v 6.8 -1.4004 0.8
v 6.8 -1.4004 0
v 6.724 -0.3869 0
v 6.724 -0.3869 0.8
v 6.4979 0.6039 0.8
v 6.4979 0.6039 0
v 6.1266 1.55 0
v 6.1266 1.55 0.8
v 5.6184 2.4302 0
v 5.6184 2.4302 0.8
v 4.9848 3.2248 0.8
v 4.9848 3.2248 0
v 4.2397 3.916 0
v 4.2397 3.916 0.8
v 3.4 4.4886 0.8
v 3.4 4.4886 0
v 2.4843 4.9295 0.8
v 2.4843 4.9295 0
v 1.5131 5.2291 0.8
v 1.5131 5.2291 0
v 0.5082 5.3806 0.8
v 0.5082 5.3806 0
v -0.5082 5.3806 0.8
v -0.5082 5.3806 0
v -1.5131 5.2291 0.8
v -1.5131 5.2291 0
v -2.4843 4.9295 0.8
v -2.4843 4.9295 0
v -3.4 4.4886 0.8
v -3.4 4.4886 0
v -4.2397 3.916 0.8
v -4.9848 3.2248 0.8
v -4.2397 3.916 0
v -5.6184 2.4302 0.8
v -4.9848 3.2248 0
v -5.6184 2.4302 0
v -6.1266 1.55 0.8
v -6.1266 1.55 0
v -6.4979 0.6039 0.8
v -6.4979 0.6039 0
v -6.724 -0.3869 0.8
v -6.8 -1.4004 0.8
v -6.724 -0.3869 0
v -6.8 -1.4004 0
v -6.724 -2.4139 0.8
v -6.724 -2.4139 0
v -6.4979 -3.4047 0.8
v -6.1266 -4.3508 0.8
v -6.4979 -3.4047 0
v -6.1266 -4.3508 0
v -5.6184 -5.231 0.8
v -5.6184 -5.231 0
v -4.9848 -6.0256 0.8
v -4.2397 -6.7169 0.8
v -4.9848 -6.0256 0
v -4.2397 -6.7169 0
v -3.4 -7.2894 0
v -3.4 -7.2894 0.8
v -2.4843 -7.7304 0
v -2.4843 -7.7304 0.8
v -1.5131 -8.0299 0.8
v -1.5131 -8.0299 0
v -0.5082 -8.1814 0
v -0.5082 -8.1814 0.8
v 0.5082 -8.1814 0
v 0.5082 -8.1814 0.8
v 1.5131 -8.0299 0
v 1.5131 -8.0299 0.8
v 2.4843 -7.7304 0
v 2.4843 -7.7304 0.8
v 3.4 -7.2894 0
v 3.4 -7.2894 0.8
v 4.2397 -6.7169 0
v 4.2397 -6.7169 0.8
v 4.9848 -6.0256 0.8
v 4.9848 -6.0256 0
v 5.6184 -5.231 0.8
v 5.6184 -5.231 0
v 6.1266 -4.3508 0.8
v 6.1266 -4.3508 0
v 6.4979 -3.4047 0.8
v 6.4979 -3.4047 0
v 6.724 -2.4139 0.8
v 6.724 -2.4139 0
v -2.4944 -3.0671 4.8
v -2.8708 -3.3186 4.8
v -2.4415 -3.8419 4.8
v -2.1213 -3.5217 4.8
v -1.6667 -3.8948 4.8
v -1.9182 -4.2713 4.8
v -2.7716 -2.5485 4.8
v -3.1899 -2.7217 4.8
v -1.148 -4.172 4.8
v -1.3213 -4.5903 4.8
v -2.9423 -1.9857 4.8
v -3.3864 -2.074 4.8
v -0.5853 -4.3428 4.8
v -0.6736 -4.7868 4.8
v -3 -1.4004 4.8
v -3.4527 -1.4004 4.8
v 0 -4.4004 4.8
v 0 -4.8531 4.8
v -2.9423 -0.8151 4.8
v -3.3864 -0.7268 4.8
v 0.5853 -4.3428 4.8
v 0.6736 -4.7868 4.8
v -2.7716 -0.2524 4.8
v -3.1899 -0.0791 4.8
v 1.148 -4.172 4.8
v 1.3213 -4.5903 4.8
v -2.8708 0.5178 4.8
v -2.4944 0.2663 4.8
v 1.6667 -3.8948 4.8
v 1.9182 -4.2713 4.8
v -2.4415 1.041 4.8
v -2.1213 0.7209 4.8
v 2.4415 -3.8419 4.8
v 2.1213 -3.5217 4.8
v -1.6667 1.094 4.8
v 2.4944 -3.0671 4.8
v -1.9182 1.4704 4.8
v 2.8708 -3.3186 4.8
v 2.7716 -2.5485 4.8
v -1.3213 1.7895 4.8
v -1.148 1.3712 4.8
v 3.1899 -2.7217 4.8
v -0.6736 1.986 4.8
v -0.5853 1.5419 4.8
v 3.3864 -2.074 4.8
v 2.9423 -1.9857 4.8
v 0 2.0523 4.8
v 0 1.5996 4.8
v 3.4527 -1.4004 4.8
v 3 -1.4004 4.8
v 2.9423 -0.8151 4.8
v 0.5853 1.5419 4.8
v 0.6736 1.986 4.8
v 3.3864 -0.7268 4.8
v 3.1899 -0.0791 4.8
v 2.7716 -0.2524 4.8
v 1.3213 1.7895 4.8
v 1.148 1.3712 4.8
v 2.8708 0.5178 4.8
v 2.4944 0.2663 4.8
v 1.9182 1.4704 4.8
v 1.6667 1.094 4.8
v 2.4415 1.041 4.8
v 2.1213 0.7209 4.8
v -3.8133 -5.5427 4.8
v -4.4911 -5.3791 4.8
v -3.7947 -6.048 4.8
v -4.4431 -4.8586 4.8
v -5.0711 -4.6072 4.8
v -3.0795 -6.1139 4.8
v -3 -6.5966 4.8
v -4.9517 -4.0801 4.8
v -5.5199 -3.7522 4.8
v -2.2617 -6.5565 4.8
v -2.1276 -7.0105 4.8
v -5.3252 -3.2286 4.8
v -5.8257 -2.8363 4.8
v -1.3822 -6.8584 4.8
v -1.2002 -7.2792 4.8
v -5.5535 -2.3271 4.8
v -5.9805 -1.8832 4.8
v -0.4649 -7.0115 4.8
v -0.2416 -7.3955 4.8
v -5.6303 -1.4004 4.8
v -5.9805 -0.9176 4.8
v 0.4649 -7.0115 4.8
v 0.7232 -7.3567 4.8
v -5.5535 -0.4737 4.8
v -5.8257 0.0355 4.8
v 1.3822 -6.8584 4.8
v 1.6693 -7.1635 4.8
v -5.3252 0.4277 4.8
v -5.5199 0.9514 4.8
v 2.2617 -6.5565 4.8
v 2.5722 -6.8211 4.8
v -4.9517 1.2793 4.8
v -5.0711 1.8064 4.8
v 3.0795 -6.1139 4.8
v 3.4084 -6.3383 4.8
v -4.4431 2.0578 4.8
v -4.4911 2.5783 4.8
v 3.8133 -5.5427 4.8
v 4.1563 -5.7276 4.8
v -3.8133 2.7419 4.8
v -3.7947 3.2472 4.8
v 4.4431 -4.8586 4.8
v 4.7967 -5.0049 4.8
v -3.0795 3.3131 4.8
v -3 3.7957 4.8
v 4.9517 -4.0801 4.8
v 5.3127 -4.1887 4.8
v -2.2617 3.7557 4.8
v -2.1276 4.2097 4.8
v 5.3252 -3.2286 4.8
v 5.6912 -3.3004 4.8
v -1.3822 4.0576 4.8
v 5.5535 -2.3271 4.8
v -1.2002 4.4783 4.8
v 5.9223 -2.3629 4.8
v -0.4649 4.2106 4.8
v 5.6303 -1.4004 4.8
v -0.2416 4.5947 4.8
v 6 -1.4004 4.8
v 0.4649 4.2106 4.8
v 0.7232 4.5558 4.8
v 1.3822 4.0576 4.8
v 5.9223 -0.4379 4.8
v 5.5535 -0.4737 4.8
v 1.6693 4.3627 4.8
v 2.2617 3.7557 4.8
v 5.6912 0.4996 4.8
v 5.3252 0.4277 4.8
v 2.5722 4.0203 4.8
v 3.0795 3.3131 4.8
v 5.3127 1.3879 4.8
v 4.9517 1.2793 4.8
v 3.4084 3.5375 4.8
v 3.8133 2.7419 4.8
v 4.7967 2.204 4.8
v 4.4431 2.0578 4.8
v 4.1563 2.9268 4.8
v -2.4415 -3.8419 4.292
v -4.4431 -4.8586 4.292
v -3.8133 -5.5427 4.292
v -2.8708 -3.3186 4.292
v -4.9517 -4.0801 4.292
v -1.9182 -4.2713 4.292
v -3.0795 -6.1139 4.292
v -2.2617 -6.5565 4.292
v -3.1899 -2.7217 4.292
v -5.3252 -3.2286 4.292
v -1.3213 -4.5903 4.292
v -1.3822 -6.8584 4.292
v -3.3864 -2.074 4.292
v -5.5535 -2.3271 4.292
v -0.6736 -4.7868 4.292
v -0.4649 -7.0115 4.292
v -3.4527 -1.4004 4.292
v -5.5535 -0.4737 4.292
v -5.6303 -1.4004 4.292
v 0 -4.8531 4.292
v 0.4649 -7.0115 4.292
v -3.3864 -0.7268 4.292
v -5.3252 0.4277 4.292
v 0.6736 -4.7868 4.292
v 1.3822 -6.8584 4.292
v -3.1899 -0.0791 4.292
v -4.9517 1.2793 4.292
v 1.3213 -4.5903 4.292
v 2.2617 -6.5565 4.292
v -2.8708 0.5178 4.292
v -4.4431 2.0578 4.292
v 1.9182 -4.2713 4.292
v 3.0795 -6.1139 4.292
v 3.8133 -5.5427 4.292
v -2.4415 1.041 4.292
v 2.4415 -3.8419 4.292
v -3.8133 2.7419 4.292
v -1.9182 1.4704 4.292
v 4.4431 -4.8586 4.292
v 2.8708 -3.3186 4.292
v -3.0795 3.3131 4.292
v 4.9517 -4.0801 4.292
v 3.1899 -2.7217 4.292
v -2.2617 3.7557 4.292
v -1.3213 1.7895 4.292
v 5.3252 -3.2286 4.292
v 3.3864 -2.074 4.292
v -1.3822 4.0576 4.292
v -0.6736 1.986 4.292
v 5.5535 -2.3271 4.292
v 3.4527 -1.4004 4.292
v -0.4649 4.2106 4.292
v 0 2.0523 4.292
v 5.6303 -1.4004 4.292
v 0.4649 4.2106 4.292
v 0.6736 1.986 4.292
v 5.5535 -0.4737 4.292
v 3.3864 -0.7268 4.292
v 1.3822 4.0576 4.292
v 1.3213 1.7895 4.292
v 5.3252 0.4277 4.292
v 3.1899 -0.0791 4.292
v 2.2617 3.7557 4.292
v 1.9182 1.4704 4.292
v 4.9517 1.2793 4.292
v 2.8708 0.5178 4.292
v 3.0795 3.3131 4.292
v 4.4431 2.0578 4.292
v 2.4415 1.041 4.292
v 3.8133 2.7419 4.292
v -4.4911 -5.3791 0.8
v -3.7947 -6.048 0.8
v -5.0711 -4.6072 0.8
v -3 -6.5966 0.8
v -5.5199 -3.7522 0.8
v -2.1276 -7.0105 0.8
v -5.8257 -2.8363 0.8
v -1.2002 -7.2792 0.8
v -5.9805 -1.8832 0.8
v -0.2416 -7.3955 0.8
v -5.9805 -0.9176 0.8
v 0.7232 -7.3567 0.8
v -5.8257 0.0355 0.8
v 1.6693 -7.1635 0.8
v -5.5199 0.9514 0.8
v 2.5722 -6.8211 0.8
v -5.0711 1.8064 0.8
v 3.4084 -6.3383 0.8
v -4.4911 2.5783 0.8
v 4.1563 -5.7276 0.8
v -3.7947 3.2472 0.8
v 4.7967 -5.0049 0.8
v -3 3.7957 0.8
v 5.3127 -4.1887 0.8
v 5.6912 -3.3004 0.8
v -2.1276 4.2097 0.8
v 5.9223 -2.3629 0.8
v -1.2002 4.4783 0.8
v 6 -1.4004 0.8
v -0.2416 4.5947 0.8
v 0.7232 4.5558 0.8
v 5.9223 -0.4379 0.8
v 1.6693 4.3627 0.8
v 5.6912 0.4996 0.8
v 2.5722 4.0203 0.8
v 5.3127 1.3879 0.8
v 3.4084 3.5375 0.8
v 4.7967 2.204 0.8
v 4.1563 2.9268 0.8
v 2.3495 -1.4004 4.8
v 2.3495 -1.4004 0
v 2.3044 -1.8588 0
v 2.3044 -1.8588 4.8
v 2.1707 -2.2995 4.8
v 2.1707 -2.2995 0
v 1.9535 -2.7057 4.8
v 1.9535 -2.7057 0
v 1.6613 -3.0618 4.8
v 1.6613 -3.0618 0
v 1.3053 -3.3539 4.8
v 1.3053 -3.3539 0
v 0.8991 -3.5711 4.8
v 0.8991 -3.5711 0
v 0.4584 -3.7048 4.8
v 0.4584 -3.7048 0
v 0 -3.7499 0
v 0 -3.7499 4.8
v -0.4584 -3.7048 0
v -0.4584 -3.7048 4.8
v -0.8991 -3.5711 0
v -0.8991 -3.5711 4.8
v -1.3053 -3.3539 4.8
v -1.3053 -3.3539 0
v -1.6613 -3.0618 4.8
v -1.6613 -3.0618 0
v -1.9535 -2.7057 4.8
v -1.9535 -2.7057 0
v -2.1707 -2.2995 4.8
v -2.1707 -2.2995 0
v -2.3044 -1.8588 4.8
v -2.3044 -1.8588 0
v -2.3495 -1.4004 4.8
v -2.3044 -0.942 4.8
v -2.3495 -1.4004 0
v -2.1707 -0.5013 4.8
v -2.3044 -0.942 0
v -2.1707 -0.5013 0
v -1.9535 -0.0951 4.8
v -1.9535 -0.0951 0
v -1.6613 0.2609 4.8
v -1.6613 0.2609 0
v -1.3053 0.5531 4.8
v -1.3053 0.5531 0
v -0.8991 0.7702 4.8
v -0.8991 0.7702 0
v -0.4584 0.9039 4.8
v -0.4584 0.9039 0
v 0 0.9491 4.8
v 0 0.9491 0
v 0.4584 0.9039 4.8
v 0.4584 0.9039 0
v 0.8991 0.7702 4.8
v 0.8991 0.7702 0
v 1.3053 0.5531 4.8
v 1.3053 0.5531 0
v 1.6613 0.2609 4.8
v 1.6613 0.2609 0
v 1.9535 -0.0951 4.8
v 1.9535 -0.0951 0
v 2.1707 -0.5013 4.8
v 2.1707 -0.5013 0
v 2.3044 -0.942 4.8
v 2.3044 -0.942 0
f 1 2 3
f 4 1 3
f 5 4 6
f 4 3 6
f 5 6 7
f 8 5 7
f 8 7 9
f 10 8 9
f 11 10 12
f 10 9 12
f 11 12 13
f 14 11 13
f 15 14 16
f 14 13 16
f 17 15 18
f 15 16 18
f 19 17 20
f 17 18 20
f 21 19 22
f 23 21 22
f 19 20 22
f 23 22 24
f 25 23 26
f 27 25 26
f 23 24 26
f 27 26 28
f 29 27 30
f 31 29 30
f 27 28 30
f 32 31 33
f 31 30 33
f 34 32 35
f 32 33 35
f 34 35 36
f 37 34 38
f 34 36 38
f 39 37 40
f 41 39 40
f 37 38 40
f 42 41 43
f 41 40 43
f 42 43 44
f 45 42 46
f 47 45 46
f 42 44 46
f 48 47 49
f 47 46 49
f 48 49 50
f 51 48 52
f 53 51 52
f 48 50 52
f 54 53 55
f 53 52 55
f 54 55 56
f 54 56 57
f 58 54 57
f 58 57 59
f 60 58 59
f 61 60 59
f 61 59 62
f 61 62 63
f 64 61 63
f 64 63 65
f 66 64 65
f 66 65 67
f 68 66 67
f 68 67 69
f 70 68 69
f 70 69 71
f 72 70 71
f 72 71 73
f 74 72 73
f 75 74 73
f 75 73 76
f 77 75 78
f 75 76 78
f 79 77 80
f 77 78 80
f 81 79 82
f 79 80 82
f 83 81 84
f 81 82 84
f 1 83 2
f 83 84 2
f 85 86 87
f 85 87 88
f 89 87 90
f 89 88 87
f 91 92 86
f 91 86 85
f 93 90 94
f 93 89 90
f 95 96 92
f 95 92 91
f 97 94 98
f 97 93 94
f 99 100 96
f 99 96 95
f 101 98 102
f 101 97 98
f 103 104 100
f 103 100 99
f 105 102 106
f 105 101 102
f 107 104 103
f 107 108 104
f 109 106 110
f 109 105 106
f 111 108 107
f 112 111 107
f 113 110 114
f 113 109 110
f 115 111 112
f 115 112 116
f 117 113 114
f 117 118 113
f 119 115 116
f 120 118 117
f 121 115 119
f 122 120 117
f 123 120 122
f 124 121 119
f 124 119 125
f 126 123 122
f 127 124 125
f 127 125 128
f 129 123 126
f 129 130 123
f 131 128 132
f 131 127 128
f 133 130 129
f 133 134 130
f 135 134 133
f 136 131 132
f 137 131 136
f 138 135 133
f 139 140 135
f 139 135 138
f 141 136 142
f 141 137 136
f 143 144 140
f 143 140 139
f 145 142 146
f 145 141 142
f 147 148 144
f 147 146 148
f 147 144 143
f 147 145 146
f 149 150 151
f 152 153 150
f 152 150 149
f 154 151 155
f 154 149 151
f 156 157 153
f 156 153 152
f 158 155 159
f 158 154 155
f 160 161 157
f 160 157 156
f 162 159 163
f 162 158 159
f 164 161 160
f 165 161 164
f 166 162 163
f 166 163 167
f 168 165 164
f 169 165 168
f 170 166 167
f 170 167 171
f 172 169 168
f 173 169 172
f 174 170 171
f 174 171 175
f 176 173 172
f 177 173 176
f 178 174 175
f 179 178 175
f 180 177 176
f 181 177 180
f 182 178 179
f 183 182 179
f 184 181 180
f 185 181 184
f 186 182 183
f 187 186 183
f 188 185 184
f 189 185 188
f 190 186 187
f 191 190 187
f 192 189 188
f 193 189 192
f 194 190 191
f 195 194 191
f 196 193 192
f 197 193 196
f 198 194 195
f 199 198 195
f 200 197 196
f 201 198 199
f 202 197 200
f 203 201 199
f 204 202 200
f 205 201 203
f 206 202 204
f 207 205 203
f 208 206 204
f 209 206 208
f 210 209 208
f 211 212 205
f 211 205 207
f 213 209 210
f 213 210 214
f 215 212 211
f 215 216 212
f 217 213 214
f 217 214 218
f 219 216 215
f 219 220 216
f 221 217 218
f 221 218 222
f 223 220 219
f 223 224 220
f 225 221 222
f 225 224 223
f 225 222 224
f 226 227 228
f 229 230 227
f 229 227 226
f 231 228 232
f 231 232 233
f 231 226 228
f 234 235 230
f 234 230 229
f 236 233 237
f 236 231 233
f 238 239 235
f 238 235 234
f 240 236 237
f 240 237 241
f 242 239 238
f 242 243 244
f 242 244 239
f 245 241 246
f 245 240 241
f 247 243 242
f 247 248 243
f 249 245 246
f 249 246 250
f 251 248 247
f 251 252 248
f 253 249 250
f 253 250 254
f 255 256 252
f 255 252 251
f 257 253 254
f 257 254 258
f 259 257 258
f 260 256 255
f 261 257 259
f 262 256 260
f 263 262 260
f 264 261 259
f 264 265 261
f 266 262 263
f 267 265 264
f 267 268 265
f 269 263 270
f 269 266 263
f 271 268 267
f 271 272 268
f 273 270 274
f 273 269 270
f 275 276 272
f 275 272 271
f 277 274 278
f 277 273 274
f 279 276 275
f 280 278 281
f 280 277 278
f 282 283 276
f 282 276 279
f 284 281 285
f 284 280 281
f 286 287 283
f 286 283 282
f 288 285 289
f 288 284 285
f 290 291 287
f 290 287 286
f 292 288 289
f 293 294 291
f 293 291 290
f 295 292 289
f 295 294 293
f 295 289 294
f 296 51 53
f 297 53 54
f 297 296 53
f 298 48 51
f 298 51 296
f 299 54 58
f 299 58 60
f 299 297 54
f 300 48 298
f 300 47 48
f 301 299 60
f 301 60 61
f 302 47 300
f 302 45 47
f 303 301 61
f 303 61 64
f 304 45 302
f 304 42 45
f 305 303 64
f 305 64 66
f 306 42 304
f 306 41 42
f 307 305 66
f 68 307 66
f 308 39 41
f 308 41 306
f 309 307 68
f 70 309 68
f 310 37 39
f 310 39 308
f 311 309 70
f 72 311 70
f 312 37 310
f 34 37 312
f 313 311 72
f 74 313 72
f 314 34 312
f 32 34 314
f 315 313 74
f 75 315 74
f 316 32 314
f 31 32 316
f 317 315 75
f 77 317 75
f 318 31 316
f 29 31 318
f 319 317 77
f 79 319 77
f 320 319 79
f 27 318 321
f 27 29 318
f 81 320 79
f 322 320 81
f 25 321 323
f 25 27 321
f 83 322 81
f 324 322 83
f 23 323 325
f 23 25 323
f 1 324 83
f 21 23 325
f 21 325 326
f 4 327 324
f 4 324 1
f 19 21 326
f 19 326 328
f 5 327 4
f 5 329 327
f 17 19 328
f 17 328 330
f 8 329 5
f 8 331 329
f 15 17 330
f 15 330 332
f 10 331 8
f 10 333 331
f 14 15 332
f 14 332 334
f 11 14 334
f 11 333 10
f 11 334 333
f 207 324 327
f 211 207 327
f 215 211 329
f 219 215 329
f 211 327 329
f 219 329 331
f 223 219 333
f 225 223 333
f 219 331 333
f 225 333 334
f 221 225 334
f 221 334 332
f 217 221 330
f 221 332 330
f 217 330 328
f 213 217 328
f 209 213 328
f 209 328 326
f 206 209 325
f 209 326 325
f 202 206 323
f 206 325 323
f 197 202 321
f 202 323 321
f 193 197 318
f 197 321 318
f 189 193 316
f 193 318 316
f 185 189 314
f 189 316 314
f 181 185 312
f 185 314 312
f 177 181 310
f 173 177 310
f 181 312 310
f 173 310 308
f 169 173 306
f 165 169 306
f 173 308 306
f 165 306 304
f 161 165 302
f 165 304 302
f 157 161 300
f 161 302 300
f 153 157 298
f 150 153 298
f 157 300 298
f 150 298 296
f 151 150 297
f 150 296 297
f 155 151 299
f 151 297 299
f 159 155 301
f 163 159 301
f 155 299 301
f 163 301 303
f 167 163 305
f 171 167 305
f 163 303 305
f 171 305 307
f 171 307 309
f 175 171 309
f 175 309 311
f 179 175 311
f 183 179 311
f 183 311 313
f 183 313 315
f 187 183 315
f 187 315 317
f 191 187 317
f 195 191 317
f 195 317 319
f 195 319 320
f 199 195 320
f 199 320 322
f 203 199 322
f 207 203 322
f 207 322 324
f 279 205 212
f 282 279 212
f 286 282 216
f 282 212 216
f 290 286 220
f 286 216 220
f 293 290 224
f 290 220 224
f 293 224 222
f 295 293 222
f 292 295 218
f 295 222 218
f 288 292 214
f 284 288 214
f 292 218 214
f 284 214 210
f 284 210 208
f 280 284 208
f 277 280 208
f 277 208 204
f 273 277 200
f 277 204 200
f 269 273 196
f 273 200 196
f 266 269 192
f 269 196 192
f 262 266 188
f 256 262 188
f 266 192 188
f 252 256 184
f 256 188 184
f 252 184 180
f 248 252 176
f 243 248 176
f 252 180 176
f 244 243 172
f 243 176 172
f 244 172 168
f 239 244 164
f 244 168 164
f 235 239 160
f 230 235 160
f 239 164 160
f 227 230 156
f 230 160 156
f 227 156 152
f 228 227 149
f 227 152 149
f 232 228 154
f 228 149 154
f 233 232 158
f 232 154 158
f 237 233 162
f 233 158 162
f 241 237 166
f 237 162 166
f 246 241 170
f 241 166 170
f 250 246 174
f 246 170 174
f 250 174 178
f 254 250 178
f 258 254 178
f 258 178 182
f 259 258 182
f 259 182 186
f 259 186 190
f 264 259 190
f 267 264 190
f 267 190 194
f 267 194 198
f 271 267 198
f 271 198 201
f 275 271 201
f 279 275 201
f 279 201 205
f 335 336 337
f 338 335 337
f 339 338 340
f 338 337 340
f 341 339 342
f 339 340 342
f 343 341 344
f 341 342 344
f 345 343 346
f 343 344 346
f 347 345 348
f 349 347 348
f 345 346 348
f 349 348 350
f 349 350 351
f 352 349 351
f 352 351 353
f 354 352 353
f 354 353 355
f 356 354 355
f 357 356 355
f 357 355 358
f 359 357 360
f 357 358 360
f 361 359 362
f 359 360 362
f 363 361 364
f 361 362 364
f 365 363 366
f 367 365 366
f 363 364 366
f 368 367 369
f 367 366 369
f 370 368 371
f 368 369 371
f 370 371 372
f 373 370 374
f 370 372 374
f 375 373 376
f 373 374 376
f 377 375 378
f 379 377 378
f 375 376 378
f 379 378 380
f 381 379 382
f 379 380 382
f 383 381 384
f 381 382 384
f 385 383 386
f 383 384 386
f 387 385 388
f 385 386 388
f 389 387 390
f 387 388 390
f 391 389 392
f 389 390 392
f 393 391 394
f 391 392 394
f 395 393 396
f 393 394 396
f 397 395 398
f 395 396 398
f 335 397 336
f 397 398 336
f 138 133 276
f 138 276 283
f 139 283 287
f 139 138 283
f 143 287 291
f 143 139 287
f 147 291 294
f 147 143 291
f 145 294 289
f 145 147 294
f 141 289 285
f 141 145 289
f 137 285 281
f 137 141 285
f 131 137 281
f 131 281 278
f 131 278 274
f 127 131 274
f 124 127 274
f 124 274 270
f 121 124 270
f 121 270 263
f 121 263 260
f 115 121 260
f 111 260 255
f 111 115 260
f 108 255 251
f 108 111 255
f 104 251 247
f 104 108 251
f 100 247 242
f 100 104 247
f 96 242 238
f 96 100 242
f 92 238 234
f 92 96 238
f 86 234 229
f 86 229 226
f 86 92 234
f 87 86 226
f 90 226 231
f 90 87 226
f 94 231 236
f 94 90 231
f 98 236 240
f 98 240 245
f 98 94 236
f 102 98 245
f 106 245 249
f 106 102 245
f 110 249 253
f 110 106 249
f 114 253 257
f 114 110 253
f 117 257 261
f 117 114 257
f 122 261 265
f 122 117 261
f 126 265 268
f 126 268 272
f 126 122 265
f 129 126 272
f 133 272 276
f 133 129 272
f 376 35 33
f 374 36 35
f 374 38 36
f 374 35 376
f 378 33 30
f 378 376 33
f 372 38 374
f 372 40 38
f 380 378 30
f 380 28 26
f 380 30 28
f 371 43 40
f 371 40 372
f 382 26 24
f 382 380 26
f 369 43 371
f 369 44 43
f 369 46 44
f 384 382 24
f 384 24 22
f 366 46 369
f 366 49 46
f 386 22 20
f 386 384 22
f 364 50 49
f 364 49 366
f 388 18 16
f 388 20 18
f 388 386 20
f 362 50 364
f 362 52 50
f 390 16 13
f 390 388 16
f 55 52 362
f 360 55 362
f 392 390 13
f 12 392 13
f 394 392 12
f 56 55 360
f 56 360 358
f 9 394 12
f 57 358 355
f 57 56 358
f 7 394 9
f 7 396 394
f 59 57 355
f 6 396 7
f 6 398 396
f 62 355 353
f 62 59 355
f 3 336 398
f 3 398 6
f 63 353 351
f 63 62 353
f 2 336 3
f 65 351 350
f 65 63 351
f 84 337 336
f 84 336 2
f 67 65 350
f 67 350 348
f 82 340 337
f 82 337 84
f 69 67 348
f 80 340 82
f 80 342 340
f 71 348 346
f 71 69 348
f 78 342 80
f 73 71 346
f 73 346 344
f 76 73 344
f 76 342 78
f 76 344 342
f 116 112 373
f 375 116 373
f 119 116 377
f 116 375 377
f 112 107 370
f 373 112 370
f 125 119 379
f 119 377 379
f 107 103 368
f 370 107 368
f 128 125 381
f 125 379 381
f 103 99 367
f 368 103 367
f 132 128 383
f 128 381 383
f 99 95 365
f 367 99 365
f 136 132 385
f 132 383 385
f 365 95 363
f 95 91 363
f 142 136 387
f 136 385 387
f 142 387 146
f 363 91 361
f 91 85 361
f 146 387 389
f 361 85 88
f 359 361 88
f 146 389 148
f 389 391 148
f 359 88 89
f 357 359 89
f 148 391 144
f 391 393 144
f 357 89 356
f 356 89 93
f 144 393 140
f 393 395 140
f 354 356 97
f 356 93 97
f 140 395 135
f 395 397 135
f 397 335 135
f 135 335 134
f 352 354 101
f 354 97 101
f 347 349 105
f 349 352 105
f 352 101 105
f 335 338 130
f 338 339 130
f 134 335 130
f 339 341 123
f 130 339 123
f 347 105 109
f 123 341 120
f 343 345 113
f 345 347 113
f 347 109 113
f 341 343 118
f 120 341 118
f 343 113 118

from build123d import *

# Parameters (mm, degrees)
F0_R     = 6.80000037
F1_DEPTH = 0.80000094
F2_R     = 6.0000007
F3_DEPTH = 3.999992
F4_R     = 2.999994
F5_DEPTH = 25.4
F6_R     = 5.6302817243
F6_R_2   = 3.4527411569
F7_DEPTH = 0.508
F8_R     = 2.999994
F8_R_2   = 2.3495
F9_DEPTH = 4.7999904


with BuildPart() as f1:
    # F0 (on Top) → F1 (new body)
    with BuildSketch(Plane.XY):
        with Locations((0, -1.4004084514)):
            Circle(F0_R)
    extrude(amount=F1_DEPTH)

    # F2 (on face) → F3 (join)
    with BuildSketch(Plane.XY.offset(0.80000094)):
        with Locations((0, -1.4004084514)):
            Circle(F2_R)
    extrude(amount=F3_DEPTH)

    # F4 (on face) → F5 (cut)
    with BuildSketch(Plane.XY.offset(4.79999294)):
        with Locations((0, -1.4004084514)):
            Circle(F4_R)
    extrude(amount=-F5_DEPTH, mode=Mode.SUBTRACT)

    # F6 (on face) → F7 (cut)
    with BuildSketch(Plane.XY.offset(4.79999294)):
        with Locations((0, -1.4004084514)):
            Circle(F6_R)
        with Locations((0, -1.4004084514)):
            Circle(F6_R_2, mode=Mode.SUBTRACT)
    extrude(amount=-F7_DEPTH, mode=Mode.SUBTRACT)

    # F8 (on face) → F9 (join)
    with BuildSketch(Plane(origin=(0, 0, 0), x_dir=(1, 0, 0), z_dir=(0, 0, -1))):
        with Locations((0, 1.4004084514)):
            Circle(F8_R)
        with Locations((0, 1.4004084514)):
            Circle(F8_R_2, mode=Mode.SUBTRACT)
    extrude(amount=-F9_DEPTH)


solid = f1.part
